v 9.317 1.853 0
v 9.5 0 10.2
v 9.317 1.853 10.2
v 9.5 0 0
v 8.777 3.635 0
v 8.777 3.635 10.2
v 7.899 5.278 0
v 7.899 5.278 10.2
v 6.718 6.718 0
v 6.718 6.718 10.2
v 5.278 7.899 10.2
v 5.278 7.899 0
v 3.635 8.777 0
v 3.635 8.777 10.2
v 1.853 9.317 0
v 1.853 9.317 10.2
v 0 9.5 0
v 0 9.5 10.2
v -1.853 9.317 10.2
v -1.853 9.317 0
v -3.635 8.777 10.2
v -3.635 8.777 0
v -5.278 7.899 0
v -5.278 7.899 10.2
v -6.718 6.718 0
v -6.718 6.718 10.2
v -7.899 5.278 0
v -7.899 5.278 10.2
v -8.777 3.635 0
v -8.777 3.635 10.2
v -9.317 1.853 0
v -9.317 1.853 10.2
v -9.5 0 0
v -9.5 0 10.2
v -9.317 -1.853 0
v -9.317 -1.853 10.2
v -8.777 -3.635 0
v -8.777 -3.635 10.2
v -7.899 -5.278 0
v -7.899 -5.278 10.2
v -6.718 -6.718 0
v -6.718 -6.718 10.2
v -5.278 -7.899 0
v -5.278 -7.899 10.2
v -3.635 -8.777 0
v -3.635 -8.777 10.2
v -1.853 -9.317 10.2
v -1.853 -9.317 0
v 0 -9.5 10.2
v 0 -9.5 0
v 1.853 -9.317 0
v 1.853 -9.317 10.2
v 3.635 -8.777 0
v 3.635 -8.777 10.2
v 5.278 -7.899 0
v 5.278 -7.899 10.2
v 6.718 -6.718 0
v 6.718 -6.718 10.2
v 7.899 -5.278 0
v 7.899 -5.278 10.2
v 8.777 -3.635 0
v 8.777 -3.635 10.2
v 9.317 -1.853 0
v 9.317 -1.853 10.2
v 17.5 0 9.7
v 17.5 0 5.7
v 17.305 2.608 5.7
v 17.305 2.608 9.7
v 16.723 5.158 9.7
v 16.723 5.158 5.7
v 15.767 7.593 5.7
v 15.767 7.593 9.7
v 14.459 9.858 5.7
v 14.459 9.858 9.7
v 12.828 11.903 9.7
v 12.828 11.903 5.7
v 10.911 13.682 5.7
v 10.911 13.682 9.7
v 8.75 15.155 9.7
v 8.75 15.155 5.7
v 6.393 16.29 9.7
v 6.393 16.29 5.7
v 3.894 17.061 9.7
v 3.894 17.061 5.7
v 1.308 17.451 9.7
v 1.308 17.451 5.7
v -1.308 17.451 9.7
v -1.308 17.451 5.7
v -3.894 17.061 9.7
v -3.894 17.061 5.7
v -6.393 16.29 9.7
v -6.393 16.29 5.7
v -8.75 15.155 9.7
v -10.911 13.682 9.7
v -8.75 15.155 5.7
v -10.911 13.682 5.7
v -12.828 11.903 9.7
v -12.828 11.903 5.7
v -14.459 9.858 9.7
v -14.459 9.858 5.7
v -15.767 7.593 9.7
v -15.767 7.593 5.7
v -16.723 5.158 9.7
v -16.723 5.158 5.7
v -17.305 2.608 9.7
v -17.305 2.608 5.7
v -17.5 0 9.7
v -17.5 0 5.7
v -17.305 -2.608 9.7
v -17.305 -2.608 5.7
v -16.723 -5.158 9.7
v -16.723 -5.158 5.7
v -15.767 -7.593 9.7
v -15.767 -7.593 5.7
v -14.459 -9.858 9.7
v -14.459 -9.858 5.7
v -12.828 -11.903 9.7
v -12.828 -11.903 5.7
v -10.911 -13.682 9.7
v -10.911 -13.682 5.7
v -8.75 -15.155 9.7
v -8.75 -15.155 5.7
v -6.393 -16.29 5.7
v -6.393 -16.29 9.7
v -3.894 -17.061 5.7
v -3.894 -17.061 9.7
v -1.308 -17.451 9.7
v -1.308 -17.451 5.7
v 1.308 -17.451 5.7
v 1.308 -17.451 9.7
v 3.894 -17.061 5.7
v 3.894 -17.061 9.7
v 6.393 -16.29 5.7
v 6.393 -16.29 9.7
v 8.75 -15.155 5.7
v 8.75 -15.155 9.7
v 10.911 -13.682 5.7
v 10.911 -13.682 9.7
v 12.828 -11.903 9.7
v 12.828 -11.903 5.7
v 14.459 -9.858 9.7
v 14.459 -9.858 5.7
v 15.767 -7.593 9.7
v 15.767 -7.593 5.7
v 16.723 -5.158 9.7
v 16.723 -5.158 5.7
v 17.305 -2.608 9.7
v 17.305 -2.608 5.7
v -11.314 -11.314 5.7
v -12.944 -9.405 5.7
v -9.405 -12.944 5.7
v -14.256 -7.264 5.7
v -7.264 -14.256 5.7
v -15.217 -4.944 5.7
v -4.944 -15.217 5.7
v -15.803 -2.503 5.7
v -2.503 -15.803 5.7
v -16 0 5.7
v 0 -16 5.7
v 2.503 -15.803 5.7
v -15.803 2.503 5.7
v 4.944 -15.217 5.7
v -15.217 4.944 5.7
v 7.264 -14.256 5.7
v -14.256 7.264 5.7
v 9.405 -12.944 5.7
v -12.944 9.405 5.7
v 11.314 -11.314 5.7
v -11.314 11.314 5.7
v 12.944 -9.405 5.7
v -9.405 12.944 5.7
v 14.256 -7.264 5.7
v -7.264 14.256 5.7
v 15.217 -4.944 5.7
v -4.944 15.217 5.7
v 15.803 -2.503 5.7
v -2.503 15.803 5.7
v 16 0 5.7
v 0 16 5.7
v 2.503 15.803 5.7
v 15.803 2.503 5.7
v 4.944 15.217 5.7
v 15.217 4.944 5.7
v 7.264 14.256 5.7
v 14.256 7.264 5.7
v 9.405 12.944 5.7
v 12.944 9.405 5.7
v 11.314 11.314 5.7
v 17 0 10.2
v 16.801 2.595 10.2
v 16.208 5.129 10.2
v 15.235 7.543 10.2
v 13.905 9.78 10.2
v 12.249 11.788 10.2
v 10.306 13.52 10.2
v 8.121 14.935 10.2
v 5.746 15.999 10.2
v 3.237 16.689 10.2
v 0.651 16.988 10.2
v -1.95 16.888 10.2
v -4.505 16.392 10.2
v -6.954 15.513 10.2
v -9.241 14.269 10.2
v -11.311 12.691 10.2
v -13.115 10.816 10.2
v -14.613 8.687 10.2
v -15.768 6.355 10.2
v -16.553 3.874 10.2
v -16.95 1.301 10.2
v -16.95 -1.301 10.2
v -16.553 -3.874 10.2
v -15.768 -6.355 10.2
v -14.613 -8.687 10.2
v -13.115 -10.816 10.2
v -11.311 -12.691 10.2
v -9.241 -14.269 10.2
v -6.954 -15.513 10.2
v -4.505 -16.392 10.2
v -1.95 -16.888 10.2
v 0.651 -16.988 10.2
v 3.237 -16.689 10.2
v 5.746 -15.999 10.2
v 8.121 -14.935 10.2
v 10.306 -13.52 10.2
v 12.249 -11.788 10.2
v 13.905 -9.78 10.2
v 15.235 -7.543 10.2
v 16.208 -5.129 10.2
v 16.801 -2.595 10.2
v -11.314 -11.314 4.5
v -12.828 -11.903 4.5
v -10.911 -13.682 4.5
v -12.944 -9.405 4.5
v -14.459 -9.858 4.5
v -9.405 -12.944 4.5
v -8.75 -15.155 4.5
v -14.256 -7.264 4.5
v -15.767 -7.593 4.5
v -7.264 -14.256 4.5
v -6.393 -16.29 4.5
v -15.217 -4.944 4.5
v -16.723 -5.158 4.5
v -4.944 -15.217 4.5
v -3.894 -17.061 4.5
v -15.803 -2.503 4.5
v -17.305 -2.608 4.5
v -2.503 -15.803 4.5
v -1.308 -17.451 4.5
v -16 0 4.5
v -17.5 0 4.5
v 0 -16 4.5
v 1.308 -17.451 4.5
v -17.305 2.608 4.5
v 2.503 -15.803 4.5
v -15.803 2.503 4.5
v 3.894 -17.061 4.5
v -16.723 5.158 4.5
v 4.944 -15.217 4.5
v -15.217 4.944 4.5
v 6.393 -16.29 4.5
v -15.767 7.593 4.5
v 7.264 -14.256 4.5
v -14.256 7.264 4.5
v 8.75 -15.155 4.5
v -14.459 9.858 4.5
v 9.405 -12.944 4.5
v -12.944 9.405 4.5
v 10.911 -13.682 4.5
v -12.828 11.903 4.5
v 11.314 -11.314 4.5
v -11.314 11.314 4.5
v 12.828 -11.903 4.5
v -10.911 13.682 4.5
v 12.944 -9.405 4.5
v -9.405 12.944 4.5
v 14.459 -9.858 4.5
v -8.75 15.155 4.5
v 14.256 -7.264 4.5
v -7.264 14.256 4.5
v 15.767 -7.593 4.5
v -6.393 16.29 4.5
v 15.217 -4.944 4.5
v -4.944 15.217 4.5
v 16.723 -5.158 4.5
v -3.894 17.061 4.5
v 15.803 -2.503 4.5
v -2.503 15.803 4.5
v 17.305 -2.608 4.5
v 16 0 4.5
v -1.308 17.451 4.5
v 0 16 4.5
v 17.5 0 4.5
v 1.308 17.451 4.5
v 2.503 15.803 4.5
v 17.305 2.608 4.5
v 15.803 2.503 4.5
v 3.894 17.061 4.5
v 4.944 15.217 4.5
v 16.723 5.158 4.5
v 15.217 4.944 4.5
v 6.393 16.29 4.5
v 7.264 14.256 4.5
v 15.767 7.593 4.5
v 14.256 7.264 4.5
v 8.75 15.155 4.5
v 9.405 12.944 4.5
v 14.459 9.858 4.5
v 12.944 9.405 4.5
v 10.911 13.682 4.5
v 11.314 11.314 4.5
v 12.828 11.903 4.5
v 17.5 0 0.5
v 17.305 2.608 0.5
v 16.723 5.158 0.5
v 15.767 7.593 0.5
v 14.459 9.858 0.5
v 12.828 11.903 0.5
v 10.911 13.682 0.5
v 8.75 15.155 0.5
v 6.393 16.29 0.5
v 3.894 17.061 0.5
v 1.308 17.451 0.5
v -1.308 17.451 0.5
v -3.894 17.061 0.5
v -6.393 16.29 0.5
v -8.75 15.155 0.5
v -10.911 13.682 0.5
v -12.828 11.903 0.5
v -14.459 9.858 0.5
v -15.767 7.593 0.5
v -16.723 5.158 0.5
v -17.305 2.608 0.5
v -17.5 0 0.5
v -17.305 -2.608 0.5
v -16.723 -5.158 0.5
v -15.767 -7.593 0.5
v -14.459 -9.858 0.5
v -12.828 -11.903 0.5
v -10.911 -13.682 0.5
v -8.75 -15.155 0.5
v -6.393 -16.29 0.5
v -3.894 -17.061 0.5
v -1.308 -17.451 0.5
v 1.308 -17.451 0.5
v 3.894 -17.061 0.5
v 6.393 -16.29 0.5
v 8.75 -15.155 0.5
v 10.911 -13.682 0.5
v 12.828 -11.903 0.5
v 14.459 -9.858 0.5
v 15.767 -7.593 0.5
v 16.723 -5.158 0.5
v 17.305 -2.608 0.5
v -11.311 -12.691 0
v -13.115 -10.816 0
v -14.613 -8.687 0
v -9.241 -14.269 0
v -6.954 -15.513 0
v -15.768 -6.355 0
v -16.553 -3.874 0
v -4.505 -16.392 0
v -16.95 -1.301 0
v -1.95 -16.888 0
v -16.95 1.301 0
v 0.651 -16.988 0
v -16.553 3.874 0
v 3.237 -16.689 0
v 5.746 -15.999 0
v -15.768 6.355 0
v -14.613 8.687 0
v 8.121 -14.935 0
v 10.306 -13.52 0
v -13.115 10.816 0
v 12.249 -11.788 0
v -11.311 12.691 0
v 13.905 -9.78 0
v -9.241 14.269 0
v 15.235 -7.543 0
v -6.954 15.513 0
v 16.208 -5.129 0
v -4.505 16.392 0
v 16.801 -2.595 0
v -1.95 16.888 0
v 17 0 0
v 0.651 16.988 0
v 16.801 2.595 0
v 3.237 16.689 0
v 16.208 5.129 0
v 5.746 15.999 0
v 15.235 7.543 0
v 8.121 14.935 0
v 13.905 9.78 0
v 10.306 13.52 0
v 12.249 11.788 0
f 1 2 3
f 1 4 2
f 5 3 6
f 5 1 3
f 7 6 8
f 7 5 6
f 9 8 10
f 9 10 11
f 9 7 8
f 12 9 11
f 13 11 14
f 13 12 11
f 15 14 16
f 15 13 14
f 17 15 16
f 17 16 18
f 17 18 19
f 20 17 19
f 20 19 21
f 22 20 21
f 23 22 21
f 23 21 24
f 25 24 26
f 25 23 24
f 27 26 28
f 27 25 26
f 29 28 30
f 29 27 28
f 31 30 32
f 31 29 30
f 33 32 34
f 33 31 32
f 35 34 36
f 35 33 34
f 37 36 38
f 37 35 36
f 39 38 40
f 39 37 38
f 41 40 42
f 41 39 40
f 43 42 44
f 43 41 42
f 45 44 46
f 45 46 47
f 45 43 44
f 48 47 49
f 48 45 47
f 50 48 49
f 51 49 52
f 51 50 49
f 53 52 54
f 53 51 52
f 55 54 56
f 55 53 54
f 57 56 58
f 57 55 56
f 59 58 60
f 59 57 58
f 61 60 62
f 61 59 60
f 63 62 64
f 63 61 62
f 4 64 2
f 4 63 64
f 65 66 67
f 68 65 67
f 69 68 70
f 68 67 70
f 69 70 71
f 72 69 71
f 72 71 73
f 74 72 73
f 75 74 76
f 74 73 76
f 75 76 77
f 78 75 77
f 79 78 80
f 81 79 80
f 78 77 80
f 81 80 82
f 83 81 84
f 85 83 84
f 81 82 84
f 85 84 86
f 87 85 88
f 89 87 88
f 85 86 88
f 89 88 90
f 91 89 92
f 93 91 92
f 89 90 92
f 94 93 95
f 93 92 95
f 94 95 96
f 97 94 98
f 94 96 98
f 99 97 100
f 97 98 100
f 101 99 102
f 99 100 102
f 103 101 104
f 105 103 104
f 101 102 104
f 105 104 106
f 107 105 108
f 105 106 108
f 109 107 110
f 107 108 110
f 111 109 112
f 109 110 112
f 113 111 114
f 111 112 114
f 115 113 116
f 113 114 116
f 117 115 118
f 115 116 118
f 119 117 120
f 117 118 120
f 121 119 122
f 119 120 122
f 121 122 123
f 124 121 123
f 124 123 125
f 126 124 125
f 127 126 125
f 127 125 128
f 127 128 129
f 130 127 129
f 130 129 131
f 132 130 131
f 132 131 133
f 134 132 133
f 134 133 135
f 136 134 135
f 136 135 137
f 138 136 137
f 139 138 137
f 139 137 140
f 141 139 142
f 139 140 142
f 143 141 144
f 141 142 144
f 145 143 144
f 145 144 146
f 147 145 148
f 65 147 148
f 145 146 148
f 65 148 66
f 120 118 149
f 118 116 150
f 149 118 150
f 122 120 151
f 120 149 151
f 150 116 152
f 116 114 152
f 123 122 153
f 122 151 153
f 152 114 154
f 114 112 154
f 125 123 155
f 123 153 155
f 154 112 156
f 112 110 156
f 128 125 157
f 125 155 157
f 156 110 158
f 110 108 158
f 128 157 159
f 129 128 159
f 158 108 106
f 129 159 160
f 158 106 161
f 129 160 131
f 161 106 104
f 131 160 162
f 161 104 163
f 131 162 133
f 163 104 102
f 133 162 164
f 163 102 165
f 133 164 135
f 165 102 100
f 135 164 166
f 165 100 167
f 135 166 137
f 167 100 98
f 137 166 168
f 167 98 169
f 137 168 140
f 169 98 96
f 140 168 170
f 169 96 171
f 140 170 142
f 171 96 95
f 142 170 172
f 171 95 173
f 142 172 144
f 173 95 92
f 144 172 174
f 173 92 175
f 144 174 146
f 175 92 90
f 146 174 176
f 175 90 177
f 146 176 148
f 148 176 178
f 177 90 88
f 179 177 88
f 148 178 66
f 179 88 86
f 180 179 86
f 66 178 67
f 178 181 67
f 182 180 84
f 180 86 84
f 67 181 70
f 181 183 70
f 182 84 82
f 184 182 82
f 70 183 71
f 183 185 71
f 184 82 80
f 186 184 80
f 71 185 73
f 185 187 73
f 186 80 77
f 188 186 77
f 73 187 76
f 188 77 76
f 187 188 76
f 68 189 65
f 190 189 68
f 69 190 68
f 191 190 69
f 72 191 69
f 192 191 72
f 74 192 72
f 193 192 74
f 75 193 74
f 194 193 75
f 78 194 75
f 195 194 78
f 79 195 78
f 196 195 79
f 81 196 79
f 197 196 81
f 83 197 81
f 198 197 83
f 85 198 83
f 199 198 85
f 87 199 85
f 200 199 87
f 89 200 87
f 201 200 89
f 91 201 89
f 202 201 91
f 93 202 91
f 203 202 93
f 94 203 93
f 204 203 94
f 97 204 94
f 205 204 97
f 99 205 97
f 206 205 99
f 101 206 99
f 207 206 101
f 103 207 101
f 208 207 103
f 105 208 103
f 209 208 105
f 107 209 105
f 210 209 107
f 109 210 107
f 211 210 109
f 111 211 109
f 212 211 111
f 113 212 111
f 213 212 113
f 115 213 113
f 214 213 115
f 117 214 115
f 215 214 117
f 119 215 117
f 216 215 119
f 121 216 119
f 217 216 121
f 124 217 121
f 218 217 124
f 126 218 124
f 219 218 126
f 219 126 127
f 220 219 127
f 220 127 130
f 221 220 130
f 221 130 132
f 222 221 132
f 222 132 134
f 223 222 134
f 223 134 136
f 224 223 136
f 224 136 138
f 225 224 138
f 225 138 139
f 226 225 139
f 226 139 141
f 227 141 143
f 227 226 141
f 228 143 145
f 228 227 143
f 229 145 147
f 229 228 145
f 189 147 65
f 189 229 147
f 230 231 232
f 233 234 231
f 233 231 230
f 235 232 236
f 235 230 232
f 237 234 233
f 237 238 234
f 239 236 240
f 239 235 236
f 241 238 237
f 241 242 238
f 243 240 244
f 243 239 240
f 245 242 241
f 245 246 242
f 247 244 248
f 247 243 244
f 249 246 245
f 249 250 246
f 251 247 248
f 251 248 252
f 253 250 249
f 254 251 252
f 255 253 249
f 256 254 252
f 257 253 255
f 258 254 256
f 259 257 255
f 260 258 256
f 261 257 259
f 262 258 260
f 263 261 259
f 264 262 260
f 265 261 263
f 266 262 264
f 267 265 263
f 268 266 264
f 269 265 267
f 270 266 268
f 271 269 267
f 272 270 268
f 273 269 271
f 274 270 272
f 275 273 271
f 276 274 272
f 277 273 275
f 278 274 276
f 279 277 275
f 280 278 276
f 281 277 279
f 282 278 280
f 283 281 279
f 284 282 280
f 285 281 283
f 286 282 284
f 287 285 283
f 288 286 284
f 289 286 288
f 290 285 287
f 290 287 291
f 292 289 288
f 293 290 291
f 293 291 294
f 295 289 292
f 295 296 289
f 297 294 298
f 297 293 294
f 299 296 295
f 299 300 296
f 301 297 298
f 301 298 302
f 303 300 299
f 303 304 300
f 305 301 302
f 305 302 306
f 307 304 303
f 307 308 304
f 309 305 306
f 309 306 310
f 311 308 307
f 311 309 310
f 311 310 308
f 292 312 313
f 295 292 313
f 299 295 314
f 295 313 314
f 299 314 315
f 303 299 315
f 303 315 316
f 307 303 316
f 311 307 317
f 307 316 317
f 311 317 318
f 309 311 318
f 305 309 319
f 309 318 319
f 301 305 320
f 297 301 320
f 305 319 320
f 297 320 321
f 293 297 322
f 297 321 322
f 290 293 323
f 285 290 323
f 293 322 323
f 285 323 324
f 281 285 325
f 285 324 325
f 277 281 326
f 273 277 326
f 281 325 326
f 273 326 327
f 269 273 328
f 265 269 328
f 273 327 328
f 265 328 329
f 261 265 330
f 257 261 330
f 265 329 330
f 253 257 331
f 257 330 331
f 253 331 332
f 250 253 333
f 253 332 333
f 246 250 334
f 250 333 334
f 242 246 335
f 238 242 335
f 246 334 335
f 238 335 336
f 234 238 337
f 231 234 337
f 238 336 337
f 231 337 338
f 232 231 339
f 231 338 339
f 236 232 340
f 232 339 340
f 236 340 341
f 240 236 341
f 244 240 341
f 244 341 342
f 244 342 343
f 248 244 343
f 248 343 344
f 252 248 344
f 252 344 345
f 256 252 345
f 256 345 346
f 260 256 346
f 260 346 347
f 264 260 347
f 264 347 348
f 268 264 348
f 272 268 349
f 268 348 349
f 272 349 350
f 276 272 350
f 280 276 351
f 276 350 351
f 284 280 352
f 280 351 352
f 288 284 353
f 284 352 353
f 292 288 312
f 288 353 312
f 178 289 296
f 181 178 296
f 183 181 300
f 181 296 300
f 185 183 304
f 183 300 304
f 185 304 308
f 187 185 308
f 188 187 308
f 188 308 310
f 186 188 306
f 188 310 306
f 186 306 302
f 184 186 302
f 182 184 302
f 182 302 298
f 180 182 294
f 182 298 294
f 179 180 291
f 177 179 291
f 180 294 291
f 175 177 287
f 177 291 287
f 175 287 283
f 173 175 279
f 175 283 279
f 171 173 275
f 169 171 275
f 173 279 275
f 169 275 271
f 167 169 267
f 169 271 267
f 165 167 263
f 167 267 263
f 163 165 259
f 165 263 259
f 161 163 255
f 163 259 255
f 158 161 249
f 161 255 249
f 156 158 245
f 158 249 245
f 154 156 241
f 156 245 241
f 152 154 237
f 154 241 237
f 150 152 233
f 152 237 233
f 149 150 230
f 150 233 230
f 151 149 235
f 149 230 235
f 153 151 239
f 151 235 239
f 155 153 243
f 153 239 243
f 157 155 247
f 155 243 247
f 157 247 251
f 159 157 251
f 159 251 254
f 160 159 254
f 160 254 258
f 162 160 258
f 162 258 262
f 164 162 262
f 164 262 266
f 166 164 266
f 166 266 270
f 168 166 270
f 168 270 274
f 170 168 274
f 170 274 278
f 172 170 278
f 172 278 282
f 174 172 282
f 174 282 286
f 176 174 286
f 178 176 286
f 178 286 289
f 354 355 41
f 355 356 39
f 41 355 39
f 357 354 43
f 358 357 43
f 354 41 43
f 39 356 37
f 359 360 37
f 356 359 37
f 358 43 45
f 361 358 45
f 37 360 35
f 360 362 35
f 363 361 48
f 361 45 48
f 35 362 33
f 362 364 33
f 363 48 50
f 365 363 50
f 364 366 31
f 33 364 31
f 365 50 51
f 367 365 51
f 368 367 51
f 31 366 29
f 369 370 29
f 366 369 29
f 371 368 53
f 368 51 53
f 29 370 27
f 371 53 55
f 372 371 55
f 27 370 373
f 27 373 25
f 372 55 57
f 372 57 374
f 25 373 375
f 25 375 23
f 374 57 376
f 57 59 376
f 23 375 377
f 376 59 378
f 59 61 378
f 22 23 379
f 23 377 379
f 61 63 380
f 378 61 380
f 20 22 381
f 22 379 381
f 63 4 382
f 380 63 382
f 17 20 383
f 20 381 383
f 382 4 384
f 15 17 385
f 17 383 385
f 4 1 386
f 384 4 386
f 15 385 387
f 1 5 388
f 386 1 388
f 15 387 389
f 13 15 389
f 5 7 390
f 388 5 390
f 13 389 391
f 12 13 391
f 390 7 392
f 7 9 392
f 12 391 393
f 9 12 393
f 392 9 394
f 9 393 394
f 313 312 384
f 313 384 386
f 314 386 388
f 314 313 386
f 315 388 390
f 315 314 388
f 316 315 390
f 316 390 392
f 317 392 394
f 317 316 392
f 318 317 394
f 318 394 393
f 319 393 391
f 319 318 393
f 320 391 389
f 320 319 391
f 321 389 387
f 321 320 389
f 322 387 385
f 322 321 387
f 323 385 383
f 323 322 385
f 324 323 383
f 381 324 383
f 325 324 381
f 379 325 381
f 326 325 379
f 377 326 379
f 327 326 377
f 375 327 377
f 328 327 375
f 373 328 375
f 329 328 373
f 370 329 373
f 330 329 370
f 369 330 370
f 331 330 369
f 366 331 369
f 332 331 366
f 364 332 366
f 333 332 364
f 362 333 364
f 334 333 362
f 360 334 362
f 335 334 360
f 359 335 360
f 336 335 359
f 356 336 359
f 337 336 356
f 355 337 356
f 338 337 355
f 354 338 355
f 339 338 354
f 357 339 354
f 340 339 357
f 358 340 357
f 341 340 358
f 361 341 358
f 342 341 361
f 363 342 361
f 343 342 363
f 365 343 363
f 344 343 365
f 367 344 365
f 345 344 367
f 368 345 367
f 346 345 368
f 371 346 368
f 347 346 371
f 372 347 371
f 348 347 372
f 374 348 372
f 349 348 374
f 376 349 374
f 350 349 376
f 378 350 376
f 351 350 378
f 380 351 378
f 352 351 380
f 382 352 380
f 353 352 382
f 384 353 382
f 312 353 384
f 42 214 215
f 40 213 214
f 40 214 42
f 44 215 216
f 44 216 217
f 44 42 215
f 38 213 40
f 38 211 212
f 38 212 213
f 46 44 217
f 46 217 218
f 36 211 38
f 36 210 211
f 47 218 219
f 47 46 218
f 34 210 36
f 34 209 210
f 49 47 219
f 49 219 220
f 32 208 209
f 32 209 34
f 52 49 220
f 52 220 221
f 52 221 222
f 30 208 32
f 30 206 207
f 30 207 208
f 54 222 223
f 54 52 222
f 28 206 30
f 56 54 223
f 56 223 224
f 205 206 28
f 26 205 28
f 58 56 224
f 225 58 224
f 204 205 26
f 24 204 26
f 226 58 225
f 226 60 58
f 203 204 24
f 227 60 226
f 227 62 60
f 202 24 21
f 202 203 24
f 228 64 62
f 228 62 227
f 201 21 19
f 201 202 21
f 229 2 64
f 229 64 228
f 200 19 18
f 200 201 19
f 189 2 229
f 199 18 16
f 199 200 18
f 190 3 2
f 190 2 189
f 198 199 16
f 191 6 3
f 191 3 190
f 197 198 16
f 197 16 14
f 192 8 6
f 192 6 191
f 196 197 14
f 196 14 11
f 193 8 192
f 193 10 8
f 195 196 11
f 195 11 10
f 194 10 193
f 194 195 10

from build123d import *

# Parameters (mm, degrees)
F0_R     = 17.5
F0_R_2   = 9.5
F1_DEPTH = 4.5
F2_R     = 16
F2_R_2   = 9.5
F3_DEPTH = 1.2
F4_R     = 17.5
F4_R_2   = 9.5
F5_DEPTH = 4.5
F6_SIZE  = 0.5


with BuildPart() as f1:
    # F0 (on Top) → F1 (new body)
    with BuildSketch(Plane.XY):
        Circle(F0_R)
        Circle(F0_R_2, mode=Mode.SUBTRACT)
    extrude(amount=F1_DEPTH)

    # F2 (on face) → F3 (join)
    with BuildSketch(Plane.XY.offset(4.5)):
        Circle(F2_R)
        Circle(F2_R_2, mode=Mode.SUBTRACT)
    extrude(amount=F3_DEPTH)

    # F4 (on face) → F5 (join)
    with BuildSketch(Plane.XY.offset(5.7)):
        Circle(F4_R)
        Circle(F4_R_2, mode=Mode.SUBTRACT)
    extrude(amount=F5_DEPTH)

    # F6
    f6_edges = [f1.edges().sort_by_distance(p)[0] for p in [
        (-17.5, 0, 10.2),
        (-17.5, 0, 0),
    ]]
    chamfer(f6_edges, length=F6_SIZE)


solid = f1.part
